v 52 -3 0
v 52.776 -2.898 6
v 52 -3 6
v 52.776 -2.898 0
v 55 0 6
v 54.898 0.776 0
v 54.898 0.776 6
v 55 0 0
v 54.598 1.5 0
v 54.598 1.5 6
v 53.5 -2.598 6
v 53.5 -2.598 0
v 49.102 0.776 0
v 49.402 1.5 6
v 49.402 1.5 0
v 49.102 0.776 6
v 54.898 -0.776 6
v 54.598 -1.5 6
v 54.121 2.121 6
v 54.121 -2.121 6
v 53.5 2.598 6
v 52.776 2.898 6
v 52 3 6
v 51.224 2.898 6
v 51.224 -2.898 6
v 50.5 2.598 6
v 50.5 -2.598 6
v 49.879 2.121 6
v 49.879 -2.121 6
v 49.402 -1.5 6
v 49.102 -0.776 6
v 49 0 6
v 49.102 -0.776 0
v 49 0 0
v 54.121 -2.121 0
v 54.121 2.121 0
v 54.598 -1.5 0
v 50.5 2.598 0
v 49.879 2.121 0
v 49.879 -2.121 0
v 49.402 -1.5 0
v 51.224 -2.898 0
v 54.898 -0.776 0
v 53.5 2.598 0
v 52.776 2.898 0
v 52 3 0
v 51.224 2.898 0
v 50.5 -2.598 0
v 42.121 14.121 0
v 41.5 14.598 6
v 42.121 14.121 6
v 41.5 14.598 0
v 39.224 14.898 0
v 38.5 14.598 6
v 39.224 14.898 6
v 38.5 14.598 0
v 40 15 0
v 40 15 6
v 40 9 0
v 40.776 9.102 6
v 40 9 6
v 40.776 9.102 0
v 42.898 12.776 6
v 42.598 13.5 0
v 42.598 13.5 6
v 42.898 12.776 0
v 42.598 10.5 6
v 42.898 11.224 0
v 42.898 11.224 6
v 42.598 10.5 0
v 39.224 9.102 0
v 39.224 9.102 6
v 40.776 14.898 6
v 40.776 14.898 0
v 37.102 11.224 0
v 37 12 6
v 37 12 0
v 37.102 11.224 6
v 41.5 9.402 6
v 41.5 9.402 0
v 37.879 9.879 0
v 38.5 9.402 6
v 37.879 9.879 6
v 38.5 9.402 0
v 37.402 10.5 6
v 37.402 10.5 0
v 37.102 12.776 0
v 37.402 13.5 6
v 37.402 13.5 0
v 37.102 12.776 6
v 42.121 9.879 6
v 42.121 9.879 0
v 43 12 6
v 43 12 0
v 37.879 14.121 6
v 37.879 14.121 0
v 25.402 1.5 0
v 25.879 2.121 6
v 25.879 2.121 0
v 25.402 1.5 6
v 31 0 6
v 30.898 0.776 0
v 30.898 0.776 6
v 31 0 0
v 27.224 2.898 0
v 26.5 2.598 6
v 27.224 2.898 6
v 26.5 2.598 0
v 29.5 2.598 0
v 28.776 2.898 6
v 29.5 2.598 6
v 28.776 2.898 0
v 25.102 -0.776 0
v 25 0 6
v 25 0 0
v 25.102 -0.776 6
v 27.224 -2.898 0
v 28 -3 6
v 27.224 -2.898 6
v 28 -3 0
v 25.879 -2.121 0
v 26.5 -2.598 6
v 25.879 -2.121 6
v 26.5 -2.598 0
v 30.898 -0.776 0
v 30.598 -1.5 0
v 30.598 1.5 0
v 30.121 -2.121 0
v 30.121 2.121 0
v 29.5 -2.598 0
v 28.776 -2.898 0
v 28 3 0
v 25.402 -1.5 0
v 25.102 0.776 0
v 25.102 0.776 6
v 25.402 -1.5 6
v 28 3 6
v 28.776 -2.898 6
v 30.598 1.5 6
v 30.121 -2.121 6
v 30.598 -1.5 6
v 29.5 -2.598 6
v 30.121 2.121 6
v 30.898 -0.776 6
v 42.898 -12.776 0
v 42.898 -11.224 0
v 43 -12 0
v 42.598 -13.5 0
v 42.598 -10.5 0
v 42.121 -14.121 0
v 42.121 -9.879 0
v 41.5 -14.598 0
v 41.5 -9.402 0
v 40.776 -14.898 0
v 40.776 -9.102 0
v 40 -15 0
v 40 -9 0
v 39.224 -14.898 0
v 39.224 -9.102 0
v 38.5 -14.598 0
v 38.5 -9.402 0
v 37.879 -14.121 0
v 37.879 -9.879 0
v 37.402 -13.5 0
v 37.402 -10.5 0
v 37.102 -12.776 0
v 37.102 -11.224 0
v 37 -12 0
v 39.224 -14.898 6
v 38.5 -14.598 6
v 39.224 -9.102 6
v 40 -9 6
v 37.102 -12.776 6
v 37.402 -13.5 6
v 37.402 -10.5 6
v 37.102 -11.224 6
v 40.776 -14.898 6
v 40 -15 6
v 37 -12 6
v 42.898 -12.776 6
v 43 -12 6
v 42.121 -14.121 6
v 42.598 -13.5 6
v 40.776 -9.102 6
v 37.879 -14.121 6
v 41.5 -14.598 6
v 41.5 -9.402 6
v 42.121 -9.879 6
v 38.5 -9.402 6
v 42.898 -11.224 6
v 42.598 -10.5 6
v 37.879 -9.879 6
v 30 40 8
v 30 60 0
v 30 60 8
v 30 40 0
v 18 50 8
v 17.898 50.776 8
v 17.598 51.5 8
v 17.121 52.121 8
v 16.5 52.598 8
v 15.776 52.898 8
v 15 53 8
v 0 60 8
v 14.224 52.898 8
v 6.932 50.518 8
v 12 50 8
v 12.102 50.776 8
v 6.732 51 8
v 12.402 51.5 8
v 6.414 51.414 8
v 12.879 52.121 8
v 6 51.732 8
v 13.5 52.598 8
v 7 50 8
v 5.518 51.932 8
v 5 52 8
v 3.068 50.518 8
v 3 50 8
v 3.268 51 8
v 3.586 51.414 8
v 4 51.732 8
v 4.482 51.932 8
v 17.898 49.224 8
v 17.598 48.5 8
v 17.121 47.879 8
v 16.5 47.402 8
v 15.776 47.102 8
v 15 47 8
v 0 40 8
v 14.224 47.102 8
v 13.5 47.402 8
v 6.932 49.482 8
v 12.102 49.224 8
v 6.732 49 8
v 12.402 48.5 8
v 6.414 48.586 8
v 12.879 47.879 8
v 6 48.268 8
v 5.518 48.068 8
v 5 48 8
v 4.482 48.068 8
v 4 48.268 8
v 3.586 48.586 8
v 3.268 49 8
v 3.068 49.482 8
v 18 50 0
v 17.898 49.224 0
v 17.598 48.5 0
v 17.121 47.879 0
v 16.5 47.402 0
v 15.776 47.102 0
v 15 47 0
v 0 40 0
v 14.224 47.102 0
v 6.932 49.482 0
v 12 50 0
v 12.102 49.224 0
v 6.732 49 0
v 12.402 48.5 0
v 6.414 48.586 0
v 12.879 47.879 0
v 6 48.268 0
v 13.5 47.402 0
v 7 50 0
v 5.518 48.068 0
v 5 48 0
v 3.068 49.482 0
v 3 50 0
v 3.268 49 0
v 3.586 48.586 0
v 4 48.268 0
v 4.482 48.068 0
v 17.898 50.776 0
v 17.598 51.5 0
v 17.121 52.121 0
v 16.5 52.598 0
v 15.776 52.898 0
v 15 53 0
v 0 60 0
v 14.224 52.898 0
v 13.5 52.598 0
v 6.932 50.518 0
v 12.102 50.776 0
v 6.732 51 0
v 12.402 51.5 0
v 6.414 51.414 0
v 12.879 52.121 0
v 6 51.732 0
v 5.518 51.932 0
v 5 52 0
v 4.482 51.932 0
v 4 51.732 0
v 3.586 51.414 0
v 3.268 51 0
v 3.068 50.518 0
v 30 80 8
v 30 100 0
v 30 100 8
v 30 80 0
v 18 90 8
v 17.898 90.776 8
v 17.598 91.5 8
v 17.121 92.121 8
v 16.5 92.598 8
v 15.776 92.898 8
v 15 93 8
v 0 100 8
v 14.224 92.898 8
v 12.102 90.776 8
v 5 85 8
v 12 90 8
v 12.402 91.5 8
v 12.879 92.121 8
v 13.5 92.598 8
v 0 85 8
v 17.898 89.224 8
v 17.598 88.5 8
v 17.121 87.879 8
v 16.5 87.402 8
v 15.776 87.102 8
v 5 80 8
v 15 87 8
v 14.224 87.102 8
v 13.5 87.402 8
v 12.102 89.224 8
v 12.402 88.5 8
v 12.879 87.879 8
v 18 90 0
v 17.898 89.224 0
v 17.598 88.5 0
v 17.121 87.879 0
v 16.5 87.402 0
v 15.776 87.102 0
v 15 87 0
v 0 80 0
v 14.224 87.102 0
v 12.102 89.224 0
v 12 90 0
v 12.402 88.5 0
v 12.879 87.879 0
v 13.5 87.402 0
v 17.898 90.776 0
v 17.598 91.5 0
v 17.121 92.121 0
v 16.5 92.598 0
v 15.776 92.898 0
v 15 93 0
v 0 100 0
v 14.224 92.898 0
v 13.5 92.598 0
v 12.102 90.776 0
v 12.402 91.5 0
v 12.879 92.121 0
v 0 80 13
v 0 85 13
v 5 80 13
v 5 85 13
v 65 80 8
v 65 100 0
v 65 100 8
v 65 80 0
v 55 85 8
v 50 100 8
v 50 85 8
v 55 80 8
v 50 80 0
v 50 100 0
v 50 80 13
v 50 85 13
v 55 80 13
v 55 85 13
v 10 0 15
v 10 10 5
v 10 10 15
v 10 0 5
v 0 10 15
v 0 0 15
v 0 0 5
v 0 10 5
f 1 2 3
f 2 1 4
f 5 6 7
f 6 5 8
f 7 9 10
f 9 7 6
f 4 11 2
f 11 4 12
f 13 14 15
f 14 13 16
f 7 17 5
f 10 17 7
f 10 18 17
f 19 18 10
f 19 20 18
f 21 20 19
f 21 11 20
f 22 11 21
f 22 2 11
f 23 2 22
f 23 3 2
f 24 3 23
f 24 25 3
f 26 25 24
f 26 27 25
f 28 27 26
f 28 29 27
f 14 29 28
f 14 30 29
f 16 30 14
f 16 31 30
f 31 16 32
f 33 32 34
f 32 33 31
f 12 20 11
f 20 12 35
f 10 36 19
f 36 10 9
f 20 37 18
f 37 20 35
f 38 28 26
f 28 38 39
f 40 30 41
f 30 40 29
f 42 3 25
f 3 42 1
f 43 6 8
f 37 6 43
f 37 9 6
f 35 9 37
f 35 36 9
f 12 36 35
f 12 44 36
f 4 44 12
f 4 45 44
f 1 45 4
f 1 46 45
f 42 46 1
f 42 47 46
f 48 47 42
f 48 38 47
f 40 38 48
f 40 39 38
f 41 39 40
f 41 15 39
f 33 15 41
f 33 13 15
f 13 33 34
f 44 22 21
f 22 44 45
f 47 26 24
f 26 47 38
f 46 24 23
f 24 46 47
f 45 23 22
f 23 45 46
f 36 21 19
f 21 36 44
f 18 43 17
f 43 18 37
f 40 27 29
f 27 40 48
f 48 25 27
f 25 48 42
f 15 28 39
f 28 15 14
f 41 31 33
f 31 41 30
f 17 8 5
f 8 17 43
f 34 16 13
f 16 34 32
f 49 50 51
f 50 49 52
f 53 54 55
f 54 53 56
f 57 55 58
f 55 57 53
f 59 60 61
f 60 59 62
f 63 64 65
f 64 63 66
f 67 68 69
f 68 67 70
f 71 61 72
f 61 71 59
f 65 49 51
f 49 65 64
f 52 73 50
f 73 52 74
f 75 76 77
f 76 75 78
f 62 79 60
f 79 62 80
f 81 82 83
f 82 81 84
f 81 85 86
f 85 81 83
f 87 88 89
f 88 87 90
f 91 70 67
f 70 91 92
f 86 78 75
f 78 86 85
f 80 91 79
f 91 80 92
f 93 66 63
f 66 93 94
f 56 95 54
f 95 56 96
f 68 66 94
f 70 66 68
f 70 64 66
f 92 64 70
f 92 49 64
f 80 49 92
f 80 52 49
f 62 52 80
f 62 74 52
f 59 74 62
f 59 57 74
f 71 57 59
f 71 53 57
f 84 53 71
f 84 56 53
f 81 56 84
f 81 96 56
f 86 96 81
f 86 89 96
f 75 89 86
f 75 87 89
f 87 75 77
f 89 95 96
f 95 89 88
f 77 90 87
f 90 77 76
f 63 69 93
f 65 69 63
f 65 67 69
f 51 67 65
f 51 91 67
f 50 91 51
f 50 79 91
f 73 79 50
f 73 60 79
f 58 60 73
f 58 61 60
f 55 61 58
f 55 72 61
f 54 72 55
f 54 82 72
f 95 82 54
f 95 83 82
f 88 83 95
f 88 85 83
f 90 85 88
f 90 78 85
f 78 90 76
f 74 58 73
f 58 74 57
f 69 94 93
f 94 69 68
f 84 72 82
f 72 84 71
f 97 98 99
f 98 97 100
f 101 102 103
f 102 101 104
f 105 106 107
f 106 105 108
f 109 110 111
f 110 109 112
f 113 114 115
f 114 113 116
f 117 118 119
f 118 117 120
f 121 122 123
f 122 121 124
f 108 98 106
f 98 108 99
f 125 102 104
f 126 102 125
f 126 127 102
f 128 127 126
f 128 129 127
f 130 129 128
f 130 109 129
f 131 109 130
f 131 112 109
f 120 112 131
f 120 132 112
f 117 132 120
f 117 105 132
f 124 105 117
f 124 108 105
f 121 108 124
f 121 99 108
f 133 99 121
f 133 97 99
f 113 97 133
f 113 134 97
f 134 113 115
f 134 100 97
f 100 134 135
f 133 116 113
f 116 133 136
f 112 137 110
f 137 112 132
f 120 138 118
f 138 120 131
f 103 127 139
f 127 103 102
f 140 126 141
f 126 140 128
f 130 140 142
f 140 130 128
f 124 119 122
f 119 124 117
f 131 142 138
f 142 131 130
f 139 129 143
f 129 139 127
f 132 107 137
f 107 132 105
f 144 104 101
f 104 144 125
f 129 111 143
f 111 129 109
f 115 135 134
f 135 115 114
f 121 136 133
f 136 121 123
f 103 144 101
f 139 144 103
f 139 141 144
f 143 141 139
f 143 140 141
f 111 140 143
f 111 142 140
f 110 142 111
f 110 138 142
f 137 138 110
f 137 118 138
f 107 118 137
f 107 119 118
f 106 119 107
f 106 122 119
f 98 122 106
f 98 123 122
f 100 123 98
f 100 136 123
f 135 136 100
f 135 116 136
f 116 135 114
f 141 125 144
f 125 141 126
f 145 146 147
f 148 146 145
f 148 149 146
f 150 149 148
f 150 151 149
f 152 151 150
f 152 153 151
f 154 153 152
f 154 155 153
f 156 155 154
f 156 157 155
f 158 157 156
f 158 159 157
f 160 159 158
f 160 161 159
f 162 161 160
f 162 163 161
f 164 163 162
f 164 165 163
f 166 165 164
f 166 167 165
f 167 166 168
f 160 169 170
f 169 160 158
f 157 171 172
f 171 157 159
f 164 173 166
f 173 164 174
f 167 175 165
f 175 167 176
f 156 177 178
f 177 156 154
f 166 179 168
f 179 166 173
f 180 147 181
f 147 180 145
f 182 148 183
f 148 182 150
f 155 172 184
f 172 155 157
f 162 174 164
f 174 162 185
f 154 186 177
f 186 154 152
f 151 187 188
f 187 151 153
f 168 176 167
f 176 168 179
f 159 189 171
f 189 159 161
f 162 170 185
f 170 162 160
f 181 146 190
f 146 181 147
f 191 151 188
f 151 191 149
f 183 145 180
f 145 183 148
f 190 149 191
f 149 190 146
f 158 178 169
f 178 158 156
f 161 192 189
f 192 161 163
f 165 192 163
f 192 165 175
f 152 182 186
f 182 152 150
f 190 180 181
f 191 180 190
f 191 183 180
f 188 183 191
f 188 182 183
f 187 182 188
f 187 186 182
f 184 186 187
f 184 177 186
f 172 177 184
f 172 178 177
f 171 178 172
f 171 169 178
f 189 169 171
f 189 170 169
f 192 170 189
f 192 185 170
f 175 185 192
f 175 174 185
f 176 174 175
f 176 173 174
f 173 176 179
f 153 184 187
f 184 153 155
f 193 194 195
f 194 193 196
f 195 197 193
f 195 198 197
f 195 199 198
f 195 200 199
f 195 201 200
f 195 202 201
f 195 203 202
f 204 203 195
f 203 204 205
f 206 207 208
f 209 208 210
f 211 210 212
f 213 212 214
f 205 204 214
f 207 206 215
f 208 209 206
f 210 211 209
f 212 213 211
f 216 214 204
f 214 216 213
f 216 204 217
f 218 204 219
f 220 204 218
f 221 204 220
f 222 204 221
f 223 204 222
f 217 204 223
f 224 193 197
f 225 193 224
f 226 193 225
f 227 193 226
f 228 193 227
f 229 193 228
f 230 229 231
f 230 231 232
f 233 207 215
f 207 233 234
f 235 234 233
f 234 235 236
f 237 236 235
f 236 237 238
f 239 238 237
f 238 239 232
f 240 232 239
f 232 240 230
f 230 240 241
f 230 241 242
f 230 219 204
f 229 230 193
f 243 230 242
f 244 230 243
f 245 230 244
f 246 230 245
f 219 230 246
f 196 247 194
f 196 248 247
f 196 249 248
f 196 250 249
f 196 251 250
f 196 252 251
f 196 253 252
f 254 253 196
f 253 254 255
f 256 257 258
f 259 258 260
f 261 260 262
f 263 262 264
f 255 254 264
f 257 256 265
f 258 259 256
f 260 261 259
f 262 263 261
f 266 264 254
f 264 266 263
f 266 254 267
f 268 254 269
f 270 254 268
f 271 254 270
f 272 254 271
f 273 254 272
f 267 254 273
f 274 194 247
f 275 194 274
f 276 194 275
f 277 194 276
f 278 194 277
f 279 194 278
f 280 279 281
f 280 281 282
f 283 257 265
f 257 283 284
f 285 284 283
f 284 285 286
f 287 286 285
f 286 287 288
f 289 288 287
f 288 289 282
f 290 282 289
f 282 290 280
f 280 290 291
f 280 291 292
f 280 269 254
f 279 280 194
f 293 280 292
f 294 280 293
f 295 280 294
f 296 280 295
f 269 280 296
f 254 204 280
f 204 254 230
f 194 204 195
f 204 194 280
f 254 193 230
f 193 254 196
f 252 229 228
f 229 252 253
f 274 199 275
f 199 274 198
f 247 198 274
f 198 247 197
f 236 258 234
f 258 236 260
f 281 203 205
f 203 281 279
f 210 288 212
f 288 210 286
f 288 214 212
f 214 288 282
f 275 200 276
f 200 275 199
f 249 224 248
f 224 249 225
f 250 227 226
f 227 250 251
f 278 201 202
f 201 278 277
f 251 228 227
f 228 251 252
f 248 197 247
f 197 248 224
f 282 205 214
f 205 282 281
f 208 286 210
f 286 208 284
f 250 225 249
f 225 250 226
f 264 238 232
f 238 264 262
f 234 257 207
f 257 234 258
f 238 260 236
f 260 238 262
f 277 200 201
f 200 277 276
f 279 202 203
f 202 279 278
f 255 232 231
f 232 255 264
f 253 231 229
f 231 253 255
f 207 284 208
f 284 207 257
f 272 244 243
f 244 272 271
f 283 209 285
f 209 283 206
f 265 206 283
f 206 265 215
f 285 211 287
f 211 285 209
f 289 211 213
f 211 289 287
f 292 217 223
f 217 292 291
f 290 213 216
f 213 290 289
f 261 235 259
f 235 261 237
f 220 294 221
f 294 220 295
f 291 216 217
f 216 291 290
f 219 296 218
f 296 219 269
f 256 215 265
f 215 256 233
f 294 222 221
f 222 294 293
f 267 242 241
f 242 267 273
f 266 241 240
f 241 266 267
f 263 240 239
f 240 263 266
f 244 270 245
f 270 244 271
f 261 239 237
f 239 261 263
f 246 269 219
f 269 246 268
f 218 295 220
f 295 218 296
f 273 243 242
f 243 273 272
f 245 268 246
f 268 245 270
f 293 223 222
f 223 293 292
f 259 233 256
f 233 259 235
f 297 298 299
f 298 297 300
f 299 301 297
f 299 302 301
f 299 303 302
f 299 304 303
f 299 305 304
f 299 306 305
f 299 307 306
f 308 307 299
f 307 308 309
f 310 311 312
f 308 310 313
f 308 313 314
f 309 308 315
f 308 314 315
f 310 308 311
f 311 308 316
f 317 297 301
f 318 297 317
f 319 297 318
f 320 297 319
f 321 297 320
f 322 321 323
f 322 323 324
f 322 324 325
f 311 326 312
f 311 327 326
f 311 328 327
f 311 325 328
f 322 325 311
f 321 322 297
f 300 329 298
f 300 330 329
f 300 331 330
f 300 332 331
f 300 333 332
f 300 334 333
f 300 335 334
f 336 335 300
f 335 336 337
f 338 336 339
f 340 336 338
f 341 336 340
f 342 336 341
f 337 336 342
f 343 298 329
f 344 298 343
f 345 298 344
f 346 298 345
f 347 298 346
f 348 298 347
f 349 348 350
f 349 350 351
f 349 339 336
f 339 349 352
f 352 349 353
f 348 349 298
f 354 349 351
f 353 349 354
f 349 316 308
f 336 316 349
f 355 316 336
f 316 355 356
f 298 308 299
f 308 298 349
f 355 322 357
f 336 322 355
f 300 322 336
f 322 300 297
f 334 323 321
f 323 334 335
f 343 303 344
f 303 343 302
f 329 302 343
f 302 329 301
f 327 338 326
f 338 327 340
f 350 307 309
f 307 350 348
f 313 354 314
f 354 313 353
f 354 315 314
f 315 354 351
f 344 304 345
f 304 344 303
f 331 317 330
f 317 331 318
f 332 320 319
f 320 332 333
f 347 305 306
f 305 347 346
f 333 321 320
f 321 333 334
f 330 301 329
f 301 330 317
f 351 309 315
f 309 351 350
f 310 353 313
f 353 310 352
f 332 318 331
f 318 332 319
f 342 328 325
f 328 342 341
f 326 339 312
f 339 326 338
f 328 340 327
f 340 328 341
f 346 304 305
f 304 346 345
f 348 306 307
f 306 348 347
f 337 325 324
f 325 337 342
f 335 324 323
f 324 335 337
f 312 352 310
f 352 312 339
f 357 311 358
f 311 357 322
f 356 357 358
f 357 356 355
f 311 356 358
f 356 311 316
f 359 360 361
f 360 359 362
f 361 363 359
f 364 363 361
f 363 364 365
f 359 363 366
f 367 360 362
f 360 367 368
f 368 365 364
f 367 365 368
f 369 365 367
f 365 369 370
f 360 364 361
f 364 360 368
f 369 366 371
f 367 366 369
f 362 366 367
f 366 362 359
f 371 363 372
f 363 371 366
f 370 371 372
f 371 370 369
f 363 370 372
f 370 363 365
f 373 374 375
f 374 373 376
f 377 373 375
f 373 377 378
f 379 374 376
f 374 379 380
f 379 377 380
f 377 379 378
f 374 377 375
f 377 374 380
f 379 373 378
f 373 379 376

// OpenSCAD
// module composition: children(), children(i), $children, empty children, if without else
module lift(h) { translate([0, 0, h]) children(); }
module ring_of(n, r) {
    for (i = [0 : n - 1]) rotate([0, 0, i * 360 / n]) translate([r, 0, 0]) children();
}
module bracket(w = 30) {
    difference() {
        cube([w, 20, 8]);
        if (w > 20) translate([w / 2, 10, -1]) cylinder(r = 3, h = 10, $fn = 24);
        children();
    }
    if ($children == 0) translate([0, 0, 8]) cube([5, 5, 5]);
}
lift(5) cube(10);
translate([40, 0, 0]) ring_of(4, 12) cylinder(r = 3, h = 6, $fn = 24);
translate([0, 40, 0]) bracket(30) translate([5, 10, -1]) cylinder(r = 2, h = 10, $fn = 24);
translate([0, 80, 0]) bracket(30);
translate([50, 80, 0]) bracket(15);
